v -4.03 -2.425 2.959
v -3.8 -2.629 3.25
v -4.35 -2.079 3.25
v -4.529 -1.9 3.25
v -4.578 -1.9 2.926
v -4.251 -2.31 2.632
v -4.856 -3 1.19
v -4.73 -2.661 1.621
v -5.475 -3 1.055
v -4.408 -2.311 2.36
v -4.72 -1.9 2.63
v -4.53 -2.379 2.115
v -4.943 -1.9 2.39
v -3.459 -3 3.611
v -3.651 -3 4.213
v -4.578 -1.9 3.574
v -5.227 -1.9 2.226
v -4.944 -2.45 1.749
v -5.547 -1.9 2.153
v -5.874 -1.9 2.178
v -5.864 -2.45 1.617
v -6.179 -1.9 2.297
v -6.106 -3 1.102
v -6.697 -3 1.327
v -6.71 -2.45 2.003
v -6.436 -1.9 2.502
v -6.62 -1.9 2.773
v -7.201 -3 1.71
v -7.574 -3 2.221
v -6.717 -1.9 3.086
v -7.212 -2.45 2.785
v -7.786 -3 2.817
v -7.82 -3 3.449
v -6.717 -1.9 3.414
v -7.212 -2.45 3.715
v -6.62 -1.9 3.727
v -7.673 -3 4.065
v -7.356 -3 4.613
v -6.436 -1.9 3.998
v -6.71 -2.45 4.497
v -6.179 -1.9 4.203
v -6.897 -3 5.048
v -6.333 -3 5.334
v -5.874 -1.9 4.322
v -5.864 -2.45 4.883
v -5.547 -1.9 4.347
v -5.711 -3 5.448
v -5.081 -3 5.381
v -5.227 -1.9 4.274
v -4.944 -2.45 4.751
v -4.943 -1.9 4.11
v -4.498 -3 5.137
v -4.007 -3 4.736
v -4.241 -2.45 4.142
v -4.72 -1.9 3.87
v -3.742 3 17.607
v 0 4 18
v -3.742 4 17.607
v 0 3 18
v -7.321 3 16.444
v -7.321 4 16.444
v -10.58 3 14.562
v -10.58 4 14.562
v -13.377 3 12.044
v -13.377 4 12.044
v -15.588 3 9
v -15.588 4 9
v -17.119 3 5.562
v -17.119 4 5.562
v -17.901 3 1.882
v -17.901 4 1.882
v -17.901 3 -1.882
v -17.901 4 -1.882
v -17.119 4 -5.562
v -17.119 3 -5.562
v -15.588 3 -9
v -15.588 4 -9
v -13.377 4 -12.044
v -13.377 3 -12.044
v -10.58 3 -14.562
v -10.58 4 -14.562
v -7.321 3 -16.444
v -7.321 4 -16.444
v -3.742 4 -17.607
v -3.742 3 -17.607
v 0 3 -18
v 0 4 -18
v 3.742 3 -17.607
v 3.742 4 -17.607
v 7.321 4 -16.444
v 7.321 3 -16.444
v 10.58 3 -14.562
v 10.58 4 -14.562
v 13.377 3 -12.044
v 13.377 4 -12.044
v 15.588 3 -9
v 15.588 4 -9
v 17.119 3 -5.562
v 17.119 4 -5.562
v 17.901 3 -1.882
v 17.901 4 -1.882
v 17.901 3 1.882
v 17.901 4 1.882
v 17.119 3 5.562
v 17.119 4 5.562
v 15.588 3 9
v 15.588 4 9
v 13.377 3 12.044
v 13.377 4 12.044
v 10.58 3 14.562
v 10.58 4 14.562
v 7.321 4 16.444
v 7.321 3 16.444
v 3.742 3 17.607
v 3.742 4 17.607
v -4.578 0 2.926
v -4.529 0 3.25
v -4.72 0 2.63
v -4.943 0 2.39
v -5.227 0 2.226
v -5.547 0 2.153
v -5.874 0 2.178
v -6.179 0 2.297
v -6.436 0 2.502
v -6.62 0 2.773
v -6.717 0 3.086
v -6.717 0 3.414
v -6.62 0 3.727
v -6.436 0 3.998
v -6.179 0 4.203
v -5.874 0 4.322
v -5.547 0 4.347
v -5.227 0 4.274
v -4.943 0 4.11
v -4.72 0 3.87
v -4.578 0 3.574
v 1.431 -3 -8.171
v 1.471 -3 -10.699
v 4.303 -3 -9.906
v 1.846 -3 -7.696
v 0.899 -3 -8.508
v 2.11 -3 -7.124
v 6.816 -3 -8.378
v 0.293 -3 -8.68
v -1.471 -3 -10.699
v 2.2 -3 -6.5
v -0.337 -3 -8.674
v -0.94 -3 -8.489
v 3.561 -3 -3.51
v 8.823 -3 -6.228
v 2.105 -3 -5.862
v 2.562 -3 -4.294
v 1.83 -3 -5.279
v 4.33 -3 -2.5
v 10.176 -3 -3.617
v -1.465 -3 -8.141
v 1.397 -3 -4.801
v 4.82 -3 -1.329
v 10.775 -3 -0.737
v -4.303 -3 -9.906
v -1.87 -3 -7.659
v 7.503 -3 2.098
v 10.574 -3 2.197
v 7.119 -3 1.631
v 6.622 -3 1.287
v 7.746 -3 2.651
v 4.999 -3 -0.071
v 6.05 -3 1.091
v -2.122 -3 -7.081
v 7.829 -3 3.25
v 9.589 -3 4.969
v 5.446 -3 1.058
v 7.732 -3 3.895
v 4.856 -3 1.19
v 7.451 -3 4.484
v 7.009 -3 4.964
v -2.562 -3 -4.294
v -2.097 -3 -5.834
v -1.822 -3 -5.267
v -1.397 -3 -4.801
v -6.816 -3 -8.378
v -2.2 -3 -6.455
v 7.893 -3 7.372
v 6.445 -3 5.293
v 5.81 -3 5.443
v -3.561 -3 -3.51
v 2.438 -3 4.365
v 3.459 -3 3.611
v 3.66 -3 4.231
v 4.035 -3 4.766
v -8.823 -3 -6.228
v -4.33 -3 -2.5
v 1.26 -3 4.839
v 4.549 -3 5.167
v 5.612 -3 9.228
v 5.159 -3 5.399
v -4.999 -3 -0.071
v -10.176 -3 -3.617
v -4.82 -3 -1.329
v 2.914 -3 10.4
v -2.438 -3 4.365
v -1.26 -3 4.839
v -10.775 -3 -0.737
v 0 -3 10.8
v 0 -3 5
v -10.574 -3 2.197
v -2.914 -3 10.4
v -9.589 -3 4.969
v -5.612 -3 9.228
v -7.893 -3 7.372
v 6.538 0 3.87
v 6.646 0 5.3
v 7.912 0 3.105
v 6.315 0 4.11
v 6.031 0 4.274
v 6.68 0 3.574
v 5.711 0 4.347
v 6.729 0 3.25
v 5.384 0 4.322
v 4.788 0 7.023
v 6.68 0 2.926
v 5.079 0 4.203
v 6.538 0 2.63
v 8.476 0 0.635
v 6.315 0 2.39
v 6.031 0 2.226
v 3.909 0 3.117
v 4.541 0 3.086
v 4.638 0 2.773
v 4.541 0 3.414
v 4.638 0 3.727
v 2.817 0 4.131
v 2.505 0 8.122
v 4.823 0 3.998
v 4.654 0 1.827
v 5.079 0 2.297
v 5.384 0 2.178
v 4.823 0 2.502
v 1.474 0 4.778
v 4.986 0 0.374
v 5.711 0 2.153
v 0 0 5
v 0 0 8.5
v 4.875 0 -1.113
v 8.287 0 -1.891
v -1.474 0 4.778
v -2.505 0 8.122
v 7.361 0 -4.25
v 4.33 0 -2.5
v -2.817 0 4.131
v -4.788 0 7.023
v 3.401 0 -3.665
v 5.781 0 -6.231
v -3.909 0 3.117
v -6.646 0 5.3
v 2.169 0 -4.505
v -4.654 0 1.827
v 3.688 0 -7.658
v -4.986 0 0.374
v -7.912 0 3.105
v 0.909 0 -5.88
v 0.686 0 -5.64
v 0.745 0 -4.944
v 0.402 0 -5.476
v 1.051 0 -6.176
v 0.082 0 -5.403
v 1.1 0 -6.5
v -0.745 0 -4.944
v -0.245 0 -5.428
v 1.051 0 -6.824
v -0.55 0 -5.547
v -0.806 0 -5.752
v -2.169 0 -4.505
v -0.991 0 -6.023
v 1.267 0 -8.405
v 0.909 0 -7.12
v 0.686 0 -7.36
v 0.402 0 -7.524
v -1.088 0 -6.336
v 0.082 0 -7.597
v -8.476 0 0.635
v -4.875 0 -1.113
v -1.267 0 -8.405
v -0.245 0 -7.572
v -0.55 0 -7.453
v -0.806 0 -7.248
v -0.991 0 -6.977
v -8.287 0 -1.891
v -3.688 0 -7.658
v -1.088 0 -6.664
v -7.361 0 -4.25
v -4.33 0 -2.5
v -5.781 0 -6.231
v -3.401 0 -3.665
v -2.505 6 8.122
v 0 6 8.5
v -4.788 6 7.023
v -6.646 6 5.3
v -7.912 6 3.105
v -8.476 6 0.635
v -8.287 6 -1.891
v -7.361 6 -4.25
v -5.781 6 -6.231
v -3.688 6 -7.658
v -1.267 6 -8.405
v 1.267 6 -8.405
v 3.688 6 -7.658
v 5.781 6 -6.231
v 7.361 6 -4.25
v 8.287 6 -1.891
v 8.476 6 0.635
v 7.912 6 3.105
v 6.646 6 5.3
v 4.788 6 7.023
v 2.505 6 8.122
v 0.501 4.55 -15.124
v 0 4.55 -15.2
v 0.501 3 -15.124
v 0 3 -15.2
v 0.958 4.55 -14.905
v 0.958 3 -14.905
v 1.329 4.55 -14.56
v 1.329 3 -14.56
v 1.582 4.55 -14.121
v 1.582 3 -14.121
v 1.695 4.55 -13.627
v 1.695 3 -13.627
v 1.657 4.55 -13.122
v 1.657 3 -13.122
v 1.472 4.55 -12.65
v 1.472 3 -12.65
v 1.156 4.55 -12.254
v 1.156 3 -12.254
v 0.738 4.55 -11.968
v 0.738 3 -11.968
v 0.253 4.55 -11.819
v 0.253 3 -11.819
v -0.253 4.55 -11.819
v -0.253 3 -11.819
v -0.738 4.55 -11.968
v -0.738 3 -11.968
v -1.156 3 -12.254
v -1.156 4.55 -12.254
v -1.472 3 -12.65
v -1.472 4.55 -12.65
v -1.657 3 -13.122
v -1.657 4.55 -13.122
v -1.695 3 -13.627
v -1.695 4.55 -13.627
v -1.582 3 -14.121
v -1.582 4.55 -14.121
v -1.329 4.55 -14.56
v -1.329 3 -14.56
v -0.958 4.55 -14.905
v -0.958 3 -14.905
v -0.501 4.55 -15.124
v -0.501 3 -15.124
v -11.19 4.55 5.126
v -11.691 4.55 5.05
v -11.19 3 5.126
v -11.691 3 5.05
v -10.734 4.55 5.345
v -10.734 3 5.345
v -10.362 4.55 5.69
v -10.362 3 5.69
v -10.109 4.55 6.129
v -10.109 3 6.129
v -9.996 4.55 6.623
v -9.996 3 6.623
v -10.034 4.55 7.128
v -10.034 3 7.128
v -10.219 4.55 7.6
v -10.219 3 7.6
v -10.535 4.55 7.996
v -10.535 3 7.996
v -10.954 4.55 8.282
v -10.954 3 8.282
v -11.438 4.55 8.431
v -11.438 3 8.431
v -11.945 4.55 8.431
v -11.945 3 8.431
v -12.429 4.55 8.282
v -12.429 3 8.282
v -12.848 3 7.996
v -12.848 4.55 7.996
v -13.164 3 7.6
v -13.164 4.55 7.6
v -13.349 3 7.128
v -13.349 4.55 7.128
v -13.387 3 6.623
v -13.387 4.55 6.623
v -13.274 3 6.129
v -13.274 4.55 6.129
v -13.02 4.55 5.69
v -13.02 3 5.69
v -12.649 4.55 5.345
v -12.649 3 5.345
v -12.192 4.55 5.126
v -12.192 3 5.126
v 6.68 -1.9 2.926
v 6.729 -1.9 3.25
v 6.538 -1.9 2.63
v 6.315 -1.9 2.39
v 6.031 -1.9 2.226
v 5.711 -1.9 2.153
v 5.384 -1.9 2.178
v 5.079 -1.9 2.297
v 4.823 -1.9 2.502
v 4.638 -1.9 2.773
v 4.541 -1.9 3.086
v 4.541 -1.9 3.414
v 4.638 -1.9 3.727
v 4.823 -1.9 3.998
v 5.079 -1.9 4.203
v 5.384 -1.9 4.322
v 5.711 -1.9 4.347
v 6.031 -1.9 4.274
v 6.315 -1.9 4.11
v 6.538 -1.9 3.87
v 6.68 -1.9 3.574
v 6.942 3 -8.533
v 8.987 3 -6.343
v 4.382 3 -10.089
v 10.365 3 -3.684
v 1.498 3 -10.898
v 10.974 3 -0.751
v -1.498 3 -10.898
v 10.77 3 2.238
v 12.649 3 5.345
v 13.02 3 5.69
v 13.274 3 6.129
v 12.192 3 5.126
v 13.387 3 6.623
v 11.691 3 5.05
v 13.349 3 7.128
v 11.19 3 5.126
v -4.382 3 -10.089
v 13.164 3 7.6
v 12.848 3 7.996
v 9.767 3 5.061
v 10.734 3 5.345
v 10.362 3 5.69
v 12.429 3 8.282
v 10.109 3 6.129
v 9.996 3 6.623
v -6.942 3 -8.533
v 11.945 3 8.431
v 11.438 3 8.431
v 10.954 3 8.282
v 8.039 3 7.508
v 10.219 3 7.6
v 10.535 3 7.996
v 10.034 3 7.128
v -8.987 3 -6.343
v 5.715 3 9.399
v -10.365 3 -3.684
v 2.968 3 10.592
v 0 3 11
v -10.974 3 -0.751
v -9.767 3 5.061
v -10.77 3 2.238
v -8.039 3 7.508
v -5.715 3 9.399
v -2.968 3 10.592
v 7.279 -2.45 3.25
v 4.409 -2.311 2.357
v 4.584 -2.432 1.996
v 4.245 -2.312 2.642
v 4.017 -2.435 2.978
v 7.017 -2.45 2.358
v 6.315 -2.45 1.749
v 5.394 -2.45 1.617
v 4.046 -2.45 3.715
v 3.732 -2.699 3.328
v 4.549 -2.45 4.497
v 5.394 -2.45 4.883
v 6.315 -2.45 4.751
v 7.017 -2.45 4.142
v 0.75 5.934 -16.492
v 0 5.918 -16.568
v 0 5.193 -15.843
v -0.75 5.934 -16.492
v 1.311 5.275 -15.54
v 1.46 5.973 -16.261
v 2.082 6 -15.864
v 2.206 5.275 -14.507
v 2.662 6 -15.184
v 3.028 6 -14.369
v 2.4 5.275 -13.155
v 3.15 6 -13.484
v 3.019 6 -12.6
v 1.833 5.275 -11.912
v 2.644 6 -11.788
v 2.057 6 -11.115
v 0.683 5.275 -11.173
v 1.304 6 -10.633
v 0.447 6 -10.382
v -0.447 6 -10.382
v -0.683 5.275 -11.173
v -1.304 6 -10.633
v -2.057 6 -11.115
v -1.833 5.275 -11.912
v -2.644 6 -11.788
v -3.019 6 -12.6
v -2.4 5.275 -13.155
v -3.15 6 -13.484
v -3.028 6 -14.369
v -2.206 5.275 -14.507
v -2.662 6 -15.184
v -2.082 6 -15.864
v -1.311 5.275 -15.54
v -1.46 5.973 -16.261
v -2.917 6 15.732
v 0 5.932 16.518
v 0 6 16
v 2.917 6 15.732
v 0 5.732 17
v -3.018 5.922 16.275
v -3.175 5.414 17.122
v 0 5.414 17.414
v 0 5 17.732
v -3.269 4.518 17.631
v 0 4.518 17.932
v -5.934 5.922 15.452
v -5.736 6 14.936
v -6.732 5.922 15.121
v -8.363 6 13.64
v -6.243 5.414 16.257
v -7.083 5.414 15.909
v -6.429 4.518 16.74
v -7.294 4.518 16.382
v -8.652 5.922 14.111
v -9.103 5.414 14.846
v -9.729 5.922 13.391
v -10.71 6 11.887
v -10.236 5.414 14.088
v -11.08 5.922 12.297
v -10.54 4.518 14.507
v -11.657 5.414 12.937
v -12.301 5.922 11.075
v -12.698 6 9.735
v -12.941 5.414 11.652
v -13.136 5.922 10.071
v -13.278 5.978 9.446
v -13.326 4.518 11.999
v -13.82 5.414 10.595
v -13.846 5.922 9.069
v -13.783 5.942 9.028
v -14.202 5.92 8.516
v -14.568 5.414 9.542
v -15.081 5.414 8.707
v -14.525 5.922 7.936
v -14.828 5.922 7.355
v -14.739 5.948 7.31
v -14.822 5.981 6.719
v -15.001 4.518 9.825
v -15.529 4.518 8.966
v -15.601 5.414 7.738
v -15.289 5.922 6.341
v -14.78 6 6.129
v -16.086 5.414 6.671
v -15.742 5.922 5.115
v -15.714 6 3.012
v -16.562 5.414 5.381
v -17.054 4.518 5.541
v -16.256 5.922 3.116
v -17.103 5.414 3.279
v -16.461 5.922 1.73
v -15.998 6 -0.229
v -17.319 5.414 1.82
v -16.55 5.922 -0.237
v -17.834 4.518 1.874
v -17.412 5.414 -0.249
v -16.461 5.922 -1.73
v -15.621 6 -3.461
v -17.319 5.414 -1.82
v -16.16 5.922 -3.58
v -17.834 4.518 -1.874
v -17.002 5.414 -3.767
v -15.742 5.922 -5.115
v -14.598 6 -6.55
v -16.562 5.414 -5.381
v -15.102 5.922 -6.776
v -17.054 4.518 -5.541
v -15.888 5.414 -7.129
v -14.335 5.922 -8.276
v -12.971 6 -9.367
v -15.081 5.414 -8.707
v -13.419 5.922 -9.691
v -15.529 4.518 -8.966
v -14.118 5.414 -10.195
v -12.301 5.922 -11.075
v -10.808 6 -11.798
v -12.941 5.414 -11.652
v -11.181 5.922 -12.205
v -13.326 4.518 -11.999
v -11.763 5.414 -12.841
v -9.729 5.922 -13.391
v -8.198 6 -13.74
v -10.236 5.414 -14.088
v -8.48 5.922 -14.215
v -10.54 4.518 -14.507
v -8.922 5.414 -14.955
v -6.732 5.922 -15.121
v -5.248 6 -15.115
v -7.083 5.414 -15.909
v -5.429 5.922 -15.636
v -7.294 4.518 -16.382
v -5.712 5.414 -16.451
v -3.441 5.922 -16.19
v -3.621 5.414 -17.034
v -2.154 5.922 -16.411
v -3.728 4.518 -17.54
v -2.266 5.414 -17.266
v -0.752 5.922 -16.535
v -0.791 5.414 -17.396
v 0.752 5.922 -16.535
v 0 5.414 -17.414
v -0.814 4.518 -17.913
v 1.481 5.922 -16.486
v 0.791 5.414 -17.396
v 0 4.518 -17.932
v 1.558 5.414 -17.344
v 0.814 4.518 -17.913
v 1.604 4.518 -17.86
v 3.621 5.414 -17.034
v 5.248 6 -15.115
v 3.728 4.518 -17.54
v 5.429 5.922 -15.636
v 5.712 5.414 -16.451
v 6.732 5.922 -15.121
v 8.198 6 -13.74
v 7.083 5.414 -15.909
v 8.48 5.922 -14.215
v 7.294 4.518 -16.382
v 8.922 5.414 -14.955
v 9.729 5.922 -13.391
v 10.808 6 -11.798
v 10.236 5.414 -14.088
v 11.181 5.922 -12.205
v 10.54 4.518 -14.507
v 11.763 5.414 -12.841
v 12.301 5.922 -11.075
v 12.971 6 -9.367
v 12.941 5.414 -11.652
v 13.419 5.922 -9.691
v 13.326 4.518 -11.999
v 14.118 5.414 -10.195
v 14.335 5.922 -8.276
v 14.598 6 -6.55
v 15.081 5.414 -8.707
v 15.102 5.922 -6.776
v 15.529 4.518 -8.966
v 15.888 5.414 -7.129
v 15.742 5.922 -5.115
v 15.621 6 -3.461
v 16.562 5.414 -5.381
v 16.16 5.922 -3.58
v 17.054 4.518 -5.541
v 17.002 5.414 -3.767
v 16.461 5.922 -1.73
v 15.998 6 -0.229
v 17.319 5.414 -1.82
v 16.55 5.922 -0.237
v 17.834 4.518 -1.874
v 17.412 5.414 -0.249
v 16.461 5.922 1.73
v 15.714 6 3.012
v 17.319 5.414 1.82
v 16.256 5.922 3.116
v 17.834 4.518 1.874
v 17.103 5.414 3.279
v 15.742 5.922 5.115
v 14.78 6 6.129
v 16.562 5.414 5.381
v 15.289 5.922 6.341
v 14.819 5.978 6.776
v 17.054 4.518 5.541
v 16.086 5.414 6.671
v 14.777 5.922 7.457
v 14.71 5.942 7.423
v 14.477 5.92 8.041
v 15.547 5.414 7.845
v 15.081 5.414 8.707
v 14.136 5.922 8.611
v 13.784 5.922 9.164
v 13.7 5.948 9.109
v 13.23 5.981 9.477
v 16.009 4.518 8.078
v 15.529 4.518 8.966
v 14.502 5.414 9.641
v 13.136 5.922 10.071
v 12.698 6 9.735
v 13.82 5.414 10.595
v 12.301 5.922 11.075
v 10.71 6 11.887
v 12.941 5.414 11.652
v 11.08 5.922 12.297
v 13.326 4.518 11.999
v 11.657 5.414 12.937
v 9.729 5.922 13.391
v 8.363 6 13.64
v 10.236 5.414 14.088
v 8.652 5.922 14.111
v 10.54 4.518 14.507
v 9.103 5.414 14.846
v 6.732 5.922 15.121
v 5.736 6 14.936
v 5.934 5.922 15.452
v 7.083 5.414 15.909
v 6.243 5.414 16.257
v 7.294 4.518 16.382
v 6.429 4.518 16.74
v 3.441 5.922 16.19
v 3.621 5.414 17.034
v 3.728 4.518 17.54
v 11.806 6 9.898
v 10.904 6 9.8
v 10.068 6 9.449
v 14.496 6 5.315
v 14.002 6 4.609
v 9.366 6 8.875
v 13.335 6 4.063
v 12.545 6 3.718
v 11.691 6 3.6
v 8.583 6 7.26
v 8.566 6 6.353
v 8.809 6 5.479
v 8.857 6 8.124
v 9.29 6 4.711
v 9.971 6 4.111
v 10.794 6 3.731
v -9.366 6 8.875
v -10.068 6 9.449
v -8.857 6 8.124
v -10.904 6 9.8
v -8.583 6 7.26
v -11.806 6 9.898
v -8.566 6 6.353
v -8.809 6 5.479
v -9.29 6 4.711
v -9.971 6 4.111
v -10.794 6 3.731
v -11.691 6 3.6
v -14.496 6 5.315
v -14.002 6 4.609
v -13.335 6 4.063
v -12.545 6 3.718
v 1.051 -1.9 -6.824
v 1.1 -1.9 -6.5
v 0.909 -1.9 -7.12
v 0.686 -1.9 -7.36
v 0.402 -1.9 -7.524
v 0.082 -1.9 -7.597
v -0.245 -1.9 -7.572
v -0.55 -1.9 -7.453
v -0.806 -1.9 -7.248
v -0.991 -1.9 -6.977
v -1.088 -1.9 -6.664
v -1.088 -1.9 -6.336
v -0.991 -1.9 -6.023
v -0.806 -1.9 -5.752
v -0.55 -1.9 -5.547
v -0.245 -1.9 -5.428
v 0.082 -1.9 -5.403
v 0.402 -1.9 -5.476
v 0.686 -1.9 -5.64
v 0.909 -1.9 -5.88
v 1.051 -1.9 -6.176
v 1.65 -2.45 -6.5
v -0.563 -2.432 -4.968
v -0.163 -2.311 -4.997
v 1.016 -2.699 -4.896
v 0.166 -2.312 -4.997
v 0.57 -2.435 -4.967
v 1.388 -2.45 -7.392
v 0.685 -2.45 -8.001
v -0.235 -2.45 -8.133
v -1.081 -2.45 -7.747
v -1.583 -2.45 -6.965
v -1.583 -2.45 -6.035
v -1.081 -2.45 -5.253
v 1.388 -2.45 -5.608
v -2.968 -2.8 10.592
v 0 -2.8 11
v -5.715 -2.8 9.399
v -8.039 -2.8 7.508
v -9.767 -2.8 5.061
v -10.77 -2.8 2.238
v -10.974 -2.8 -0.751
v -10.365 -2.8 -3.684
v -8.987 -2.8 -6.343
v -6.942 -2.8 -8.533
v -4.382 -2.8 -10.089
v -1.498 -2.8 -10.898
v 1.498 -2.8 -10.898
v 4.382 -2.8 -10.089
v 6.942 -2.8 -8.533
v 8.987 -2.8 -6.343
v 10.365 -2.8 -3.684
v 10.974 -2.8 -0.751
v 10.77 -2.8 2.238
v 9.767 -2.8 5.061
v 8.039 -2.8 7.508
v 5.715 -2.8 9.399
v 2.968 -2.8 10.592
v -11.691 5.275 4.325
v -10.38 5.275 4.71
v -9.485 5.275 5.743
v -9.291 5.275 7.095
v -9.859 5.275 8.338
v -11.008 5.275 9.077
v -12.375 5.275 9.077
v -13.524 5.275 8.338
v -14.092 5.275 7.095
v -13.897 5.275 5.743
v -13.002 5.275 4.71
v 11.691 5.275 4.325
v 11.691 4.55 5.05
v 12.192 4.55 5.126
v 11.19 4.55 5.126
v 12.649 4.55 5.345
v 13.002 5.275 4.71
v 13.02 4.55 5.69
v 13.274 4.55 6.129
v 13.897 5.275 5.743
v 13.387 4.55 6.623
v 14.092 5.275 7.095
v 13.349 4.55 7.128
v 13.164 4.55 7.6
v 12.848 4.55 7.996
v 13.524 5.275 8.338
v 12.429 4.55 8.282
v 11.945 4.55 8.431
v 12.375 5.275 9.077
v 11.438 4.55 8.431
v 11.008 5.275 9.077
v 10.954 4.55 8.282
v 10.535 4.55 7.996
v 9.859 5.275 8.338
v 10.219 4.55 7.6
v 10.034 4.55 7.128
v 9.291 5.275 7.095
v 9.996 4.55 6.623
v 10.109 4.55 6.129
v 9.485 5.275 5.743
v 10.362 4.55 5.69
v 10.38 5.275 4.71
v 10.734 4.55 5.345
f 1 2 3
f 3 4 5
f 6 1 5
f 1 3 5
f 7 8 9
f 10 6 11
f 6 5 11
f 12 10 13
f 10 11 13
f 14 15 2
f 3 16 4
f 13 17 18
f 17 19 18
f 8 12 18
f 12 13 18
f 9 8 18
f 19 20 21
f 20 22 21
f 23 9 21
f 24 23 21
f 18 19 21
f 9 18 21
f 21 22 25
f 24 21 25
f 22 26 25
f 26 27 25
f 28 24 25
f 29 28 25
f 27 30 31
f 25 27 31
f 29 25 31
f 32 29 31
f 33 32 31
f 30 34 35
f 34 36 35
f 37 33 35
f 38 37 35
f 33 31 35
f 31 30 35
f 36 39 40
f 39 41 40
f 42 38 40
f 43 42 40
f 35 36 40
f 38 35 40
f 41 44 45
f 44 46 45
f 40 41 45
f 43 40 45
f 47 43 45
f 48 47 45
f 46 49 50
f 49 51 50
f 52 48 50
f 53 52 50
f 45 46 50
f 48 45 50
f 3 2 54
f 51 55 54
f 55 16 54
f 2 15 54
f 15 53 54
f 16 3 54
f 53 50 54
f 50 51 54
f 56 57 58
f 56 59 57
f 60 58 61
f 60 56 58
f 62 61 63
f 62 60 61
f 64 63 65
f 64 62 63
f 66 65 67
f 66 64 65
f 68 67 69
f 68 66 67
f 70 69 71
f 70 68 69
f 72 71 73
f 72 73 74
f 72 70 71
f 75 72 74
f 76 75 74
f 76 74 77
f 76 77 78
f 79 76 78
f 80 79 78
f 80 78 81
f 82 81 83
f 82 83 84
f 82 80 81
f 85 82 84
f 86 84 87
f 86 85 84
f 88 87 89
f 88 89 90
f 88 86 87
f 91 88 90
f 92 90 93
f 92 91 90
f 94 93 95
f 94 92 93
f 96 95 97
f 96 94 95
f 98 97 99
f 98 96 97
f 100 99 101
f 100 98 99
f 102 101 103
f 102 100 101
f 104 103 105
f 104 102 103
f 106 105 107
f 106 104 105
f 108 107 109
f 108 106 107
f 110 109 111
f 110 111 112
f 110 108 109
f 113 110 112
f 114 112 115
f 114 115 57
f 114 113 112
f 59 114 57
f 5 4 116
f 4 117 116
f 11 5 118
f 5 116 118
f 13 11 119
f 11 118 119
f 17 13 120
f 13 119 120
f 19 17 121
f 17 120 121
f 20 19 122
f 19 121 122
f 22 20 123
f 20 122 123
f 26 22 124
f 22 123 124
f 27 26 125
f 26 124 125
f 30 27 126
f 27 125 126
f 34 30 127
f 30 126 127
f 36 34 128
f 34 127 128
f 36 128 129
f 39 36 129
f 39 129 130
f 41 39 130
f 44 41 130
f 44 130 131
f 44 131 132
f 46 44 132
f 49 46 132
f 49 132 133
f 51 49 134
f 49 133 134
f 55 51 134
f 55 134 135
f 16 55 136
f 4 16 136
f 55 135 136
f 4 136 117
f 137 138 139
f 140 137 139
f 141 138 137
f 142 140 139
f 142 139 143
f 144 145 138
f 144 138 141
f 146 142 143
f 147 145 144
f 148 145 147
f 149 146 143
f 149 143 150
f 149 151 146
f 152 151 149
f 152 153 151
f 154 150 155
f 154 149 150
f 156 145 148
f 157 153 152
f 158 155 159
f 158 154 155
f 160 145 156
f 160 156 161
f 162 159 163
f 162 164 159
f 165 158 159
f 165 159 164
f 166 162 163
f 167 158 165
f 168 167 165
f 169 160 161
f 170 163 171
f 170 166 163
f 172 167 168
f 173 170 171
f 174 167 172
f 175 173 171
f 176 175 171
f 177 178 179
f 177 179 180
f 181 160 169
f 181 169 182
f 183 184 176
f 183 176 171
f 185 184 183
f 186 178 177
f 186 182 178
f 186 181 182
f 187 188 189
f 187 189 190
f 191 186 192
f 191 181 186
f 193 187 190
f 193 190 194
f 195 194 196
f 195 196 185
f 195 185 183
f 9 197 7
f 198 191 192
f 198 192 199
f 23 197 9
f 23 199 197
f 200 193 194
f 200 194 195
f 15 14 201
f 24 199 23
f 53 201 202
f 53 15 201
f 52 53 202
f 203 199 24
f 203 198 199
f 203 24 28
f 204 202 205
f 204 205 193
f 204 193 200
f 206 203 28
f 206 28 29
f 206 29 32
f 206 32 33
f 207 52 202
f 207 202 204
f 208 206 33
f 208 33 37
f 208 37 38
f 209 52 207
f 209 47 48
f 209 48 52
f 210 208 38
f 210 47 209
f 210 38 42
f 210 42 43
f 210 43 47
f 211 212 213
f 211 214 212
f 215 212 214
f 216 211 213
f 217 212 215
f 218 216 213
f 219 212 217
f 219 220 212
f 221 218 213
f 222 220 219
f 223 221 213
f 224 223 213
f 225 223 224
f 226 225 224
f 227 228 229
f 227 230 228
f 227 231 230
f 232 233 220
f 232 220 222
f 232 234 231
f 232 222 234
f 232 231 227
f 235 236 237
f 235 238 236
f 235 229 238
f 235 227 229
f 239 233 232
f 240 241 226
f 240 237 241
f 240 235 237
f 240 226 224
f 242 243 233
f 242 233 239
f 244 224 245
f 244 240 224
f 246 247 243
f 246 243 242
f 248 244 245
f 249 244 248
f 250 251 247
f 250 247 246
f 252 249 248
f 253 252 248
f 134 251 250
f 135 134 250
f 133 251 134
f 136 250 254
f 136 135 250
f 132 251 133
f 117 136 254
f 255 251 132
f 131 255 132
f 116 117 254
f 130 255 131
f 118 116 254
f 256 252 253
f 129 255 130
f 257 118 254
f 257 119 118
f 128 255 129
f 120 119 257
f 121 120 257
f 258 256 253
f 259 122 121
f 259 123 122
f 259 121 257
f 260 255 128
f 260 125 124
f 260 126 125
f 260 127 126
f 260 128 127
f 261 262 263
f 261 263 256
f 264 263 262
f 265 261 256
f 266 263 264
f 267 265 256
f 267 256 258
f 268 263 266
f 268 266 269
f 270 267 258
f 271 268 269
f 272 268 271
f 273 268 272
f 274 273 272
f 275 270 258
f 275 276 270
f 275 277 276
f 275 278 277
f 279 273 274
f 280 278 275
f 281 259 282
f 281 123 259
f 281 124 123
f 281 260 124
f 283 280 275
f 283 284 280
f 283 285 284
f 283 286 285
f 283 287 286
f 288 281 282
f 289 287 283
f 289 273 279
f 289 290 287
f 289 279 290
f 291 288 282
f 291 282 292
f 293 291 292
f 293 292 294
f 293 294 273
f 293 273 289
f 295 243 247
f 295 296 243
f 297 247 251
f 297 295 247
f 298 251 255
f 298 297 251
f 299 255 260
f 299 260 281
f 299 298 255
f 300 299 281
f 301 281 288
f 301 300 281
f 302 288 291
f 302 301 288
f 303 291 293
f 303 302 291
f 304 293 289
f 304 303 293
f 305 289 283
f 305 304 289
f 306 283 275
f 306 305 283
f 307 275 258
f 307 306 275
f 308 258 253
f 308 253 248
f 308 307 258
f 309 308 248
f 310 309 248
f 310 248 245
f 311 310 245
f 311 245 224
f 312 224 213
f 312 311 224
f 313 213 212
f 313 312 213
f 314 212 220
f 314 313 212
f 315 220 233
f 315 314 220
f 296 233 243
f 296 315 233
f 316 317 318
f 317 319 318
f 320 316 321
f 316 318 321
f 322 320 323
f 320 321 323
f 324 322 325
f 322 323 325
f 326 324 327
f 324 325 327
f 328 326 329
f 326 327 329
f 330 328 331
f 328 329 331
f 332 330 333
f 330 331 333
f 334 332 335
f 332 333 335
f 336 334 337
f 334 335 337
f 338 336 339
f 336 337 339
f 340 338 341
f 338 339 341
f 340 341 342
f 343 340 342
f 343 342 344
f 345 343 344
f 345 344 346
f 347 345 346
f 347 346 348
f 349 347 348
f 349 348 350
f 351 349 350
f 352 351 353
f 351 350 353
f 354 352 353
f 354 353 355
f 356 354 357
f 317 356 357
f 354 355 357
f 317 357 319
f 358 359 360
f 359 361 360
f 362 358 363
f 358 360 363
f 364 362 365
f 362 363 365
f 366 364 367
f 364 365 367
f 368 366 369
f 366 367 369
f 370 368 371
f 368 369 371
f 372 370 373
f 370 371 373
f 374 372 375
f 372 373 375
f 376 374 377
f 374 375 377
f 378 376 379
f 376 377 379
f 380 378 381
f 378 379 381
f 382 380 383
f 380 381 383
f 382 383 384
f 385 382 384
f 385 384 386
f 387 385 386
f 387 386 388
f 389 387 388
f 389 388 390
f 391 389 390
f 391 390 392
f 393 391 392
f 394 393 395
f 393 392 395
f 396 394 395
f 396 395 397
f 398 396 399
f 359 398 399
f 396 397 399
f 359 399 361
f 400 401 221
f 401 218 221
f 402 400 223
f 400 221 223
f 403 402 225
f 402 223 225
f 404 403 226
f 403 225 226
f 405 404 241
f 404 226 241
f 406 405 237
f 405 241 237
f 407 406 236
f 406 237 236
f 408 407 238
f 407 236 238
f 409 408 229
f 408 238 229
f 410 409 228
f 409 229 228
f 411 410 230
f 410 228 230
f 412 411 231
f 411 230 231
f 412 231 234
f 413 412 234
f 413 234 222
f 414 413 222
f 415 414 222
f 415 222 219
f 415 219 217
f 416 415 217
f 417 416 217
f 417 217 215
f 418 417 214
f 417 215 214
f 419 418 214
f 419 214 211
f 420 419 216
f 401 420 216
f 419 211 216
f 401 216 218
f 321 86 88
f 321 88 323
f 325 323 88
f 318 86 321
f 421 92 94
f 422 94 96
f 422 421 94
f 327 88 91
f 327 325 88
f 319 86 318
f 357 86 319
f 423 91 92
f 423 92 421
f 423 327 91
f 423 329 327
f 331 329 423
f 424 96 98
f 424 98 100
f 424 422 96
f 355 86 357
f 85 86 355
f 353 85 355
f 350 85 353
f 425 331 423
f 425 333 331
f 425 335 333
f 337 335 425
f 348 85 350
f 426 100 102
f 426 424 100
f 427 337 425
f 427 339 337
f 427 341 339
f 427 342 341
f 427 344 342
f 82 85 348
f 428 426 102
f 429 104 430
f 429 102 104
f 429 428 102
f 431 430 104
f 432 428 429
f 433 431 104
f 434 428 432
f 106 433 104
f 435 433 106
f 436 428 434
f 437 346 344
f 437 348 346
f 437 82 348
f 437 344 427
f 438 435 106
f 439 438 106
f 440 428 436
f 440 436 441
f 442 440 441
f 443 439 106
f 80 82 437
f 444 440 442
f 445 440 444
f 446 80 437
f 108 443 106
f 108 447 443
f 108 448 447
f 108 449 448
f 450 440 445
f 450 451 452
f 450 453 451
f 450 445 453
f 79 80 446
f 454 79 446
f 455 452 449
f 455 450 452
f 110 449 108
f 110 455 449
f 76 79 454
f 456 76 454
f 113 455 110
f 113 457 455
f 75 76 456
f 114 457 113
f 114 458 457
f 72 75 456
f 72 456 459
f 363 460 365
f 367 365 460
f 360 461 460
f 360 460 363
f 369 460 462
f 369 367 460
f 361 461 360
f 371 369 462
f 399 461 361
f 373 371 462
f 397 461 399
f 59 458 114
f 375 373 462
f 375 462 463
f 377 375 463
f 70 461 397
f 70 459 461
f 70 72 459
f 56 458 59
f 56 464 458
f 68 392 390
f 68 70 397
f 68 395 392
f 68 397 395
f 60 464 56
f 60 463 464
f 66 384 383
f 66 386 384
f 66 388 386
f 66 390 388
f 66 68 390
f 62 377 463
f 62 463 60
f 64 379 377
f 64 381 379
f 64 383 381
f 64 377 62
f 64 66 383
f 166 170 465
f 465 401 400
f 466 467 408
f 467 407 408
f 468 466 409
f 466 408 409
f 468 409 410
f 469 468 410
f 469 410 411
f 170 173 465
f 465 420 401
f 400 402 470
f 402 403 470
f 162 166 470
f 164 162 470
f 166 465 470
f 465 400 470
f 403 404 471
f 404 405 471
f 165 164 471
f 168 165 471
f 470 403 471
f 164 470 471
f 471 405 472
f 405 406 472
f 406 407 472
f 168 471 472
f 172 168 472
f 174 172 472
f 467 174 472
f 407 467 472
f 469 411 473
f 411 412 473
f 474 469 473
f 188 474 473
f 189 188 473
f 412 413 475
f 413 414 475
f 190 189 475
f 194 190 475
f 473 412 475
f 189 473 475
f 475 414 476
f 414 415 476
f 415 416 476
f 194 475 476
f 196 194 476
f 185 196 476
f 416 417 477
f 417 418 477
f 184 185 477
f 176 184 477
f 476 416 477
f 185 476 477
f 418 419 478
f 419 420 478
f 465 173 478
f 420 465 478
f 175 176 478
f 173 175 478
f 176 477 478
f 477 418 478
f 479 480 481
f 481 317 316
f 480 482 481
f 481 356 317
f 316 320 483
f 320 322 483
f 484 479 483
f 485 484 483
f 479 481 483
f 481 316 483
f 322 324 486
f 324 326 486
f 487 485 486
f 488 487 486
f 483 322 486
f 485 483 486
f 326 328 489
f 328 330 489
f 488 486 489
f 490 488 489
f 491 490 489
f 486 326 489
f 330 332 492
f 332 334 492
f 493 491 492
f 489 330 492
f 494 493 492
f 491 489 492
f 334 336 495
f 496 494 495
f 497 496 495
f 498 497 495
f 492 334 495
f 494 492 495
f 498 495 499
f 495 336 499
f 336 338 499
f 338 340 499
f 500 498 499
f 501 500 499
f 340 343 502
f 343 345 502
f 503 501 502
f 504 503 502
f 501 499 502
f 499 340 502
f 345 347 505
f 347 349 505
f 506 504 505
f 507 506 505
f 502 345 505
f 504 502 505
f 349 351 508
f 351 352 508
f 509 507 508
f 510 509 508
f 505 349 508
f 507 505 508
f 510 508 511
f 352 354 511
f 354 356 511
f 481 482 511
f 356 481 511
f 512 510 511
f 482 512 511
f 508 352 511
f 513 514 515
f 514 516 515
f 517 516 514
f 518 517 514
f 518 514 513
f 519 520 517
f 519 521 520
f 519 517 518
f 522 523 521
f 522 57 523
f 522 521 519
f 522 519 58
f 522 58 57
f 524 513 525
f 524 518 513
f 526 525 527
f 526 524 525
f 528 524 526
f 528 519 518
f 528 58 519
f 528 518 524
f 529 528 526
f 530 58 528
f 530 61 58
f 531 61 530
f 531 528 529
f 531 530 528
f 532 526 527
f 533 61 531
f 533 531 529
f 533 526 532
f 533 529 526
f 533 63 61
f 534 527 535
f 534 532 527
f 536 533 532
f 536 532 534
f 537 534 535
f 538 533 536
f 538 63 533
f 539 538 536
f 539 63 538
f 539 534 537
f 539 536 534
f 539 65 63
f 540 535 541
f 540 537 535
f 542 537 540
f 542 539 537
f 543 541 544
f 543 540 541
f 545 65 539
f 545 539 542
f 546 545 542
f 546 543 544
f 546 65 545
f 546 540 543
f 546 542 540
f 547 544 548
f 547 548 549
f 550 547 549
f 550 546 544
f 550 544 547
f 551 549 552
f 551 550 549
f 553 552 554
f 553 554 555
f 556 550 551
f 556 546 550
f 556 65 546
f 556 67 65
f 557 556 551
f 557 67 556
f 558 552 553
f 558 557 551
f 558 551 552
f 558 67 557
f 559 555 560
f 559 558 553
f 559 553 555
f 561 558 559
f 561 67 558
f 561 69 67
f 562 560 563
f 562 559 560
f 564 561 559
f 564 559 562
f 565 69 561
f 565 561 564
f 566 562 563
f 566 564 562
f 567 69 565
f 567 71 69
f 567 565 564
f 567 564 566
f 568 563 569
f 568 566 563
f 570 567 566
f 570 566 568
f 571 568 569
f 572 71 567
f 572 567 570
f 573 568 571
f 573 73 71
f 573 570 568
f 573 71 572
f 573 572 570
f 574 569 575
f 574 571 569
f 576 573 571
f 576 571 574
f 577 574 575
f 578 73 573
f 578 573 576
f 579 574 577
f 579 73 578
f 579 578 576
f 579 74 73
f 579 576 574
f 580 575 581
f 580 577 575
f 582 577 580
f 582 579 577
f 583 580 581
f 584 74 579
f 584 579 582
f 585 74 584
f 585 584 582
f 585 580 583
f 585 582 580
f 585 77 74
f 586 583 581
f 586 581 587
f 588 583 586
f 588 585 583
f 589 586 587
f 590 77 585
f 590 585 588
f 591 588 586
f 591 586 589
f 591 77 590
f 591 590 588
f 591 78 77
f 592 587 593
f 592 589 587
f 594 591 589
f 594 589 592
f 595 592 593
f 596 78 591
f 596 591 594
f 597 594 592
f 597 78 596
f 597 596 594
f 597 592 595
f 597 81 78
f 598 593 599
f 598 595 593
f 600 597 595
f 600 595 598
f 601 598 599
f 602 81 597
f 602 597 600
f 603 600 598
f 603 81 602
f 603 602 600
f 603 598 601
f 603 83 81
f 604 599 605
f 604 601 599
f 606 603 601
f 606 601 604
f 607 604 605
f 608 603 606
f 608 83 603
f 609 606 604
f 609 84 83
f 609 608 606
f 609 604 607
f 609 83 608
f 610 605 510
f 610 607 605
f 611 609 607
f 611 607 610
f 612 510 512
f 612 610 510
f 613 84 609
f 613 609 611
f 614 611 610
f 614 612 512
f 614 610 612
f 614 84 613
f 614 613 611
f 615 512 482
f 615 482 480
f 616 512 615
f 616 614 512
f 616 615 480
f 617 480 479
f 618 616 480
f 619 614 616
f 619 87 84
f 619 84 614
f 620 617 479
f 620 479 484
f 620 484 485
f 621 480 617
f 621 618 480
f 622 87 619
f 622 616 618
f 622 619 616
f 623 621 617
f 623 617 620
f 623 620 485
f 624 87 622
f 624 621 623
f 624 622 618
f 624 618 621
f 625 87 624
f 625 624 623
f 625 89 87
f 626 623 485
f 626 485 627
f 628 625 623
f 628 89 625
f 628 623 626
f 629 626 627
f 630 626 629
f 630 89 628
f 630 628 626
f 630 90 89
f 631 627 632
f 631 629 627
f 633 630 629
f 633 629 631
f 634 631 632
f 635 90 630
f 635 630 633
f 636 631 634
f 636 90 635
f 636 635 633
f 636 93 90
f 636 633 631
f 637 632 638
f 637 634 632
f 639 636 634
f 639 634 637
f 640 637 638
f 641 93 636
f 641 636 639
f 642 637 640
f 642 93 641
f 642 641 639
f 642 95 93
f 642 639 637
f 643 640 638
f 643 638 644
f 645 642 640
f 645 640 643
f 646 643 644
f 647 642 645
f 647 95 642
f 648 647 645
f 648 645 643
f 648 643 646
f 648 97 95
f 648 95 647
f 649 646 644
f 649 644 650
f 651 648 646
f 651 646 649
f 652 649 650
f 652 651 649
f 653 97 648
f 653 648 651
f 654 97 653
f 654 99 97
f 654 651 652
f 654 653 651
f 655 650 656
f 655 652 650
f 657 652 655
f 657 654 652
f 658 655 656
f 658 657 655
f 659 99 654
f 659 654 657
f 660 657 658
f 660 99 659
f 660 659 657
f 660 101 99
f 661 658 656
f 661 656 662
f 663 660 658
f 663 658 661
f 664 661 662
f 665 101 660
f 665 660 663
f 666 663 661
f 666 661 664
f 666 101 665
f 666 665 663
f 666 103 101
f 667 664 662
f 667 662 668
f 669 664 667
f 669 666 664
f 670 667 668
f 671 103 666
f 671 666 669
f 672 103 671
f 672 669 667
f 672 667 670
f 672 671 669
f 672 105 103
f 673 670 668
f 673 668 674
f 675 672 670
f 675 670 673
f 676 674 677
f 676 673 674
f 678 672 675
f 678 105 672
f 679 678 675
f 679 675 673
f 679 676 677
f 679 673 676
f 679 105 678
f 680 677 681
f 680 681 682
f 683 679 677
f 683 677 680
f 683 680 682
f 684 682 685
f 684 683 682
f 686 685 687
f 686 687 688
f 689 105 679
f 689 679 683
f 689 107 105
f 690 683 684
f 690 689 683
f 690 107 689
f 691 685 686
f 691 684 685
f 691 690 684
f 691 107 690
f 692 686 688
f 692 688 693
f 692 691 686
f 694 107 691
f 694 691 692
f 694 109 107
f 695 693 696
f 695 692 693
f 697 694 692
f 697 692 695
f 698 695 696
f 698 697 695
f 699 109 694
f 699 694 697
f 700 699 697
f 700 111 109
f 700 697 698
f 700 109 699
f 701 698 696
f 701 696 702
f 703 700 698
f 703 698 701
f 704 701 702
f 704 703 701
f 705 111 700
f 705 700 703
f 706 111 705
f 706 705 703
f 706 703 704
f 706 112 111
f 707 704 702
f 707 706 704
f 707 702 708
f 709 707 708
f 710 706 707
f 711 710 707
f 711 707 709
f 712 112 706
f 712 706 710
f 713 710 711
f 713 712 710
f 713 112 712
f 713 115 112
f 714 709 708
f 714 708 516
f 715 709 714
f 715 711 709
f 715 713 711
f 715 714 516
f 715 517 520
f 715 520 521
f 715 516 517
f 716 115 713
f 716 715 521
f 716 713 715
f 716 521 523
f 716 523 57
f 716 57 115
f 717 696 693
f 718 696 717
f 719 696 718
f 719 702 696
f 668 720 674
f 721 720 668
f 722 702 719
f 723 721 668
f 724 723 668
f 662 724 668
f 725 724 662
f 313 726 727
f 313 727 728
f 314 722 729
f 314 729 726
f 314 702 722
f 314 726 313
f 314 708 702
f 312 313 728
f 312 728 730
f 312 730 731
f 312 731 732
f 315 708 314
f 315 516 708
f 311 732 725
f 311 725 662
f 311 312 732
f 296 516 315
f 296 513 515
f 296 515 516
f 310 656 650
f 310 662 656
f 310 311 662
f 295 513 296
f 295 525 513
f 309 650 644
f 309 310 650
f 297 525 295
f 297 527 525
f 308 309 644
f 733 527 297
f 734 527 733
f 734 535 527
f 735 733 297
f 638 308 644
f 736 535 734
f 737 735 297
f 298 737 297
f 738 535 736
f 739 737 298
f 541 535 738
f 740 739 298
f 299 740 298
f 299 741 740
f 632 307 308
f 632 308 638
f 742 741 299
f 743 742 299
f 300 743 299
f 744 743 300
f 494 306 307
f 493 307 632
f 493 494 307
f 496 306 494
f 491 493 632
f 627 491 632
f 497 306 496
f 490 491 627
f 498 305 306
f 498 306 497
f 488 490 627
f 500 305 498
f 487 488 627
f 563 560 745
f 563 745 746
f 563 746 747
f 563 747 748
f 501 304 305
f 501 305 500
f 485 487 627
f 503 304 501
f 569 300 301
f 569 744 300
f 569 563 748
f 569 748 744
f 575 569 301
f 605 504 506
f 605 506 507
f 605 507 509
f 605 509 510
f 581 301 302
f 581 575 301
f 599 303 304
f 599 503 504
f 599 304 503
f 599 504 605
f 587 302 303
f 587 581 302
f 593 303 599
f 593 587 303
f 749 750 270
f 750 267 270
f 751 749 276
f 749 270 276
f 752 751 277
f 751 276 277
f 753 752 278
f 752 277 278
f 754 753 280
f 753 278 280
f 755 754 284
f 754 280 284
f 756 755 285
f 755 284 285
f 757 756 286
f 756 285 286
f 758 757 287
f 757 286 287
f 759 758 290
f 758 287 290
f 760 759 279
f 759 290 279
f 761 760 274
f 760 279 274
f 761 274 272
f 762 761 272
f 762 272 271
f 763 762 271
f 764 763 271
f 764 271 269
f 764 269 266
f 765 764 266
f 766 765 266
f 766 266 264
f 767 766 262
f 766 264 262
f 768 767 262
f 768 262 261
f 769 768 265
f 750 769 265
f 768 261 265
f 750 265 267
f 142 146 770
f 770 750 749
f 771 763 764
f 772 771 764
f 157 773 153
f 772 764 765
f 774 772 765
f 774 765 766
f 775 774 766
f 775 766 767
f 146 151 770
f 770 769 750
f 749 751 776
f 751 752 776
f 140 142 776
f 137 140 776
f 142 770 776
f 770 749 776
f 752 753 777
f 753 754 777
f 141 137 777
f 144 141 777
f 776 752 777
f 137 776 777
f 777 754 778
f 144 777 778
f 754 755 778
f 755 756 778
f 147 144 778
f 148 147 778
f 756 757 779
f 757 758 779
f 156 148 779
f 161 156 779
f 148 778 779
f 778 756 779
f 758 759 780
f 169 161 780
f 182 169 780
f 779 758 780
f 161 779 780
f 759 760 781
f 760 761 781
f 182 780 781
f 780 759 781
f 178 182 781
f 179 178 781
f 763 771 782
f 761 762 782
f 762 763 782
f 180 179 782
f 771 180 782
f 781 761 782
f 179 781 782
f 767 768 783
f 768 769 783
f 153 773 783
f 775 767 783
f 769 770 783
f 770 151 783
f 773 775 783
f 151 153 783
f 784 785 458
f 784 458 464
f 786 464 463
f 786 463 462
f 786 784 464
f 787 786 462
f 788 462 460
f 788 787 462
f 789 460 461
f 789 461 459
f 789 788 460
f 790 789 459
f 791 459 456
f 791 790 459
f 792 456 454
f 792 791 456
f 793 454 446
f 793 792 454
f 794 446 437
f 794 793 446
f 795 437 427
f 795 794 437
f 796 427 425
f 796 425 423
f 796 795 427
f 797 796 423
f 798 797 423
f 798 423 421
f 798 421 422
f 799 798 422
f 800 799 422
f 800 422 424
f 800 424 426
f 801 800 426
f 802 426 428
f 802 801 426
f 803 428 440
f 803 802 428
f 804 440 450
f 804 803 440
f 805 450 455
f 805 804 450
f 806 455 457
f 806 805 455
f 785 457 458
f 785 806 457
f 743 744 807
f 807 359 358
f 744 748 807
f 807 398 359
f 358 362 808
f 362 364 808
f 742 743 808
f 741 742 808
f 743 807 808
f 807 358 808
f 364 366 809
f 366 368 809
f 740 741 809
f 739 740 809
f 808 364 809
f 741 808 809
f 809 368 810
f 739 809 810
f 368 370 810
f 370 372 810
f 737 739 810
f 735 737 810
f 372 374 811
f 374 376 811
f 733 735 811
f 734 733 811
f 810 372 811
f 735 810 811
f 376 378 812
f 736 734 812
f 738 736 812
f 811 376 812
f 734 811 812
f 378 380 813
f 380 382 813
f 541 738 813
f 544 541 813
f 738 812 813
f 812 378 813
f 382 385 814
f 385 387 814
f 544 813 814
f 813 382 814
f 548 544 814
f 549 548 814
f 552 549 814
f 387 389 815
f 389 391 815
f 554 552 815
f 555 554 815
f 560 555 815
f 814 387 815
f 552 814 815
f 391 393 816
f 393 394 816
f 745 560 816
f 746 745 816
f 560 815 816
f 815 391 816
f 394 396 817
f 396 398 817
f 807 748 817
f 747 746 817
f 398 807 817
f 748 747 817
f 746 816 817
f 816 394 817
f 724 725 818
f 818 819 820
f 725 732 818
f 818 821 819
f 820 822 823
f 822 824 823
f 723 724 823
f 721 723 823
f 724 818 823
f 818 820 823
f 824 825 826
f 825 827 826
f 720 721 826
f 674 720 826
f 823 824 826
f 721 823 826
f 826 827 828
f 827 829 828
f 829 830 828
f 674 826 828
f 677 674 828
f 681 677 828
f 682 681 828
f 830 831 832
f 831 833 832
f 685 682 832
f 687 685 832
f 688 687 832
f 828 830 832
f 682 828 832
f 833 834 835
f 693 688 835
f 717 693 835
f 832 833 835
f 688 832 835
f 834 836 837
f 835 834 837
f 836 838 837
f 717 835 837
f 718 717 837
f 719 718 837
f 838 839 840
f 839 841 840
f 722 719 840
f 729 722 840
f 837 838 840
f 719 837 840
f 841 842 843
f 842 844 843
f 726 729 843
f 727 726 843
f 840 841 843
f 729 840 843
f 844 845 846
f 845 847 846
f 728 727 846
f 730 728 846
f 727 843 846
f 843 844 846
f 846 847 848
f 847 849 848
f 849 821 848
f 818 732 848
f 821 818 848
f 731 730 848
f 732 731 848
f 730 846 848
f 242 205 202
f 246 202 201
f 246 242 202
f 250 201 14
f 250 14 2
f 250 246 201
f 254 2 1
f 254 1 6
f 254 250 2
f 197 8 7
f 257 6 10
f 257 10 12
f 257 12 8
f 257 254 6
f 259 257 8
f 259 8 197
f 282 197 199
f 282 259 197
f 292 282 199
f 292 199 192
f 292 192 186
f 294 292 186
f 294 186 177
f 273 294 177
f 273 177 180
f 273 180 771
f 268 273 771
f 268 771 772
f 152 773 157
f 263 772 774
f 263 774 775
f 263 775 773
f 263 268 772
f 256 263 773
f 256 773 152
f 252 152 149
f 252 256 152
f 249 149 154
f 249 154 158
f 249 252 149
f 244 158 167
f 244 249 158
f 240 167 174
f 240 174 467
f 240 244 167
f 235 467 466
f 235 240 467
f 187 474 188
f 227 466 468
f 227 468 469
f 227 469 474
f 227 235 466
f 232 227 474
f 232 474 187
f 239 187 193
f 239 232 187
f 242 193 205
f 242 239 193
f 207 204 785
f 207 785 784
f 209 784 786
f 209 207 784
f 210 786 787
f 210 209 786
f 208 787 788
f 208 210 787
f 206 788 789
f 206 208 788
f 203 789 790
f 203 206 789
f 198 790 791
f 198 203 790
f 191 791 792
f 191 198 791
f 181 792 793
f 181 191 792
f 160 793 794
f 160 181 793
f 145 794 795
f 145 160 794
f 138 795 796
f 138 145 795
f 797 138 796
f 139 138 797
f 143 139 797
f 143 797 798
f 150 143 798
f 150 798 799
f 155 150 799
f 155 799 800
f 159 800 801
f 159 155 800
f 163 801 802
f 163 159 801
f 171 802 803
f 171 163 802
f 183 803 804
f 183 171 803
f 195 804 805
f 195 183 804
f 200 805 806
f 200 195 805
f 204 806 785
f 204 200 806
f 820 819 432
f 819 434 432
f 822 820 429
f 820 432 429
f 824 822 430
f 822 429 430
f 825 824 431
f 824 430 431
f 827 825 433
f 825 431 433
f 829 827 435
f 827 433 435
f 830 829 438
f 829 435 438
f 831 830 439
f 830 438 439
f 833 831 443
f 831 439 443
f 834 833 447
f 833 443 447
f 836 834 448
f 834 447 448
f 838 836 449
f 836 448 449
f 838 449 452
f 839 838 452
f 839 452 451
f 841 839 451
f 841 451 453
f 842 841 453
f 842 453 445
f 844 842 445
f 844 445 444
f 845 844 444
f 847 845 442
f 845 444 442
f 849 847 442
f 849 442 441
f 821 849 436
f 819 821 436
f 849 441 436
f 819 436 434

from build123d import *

# Parameters (mm, degrees)
CHANFREIN1_SIZE                                = 0.2
FRAISAGE_POUR_VIS_T_TE_FRAIS_E_M31_D           = 3.4
FRAISAGE_POUR_VIS_T_TE_FRAIS_E_M31_CSINK_D     = 6.3
FRAISAGE_POUR_VIS_T_TE_FRAIS_E_M31_CSINK_ANGLE = 90
CONG_1_R                                       = 2
FRAISAGE_POUR_VIS_T_TE_FRAIS_E_M22_D           = 2.2
FRAISAGE_POUR_VIS_T_TE_FRAIS_E_M22_CSINK_D     = 4.4
FRAISAGE_POUR_VIS_T_TE_FRAIS_E_M22_CSINK_ANGLE = 90


with BuildPart() as part:
    # Esquisse1 → Révolution1 (revolve)
    with BuildSketch(Plane(origin=(0, 0, 0), x_dir=(0, 0, -1), z_dir=(1, 0, 0))):
        Polygon((-5, -3), (-5, 0), (-8.5, 0), (-8.5, 6), (-18, 6), (-18, 3), (-11, 3), (-11, -3), align=None)
    revolve(axis=Axis((0, 0, 0), (0, -1, 0)))

    # Chanfrein1
    chanfrein1_edges = [part.edges().sort_by_distance(p)[0] for p in [
        (0, -3, -11),
    ]]
    chamfer(chanfrein1_edges, length=CHANFREIN1_SIZE)

    # Fraisage pour vis à tête fraisée M31 (through all)
    with Locations(Plane(origin=(0, 6, -13.5), x_dir=(0, 0, 1), z_dir=(0, 1, 0))):
        with Locations((0, 0), (20.25, 11.691342951), (20.25, -11.691342951)):
            CounterSinkHole(FRAISAGE_POUR_VIS_T_TE_FRAIS_E_M31_D / 2, FRAISAGE_POUR_VIS_T_TE_FRAIS_E_M31_CSINK_D / 2, counter_sink_angle=FRAISAGE_POUR_VIS_T_TE_FRAIS_E_M31_CSINK_ANGLE)

    # Congé1
    # the kernel refuses this fillet: 2 mm, written as the material it takes off along each edge
    with BuildSketch(Plane(origin=(0, 6, 0), x_dir=(0, 0, 1), z_dir=(1, 0, 0))) as cong_1_piece_1:
        with BuildLine():
            CenterArc((18 - CONG_1_R, CONG_1_R), CONG_1_R, 270, 90)
            Line((18, CONG_1_R), (18, 0))
            Line((18, 0), (18 - CONG_1_R, 0))
        make_face()
    revolve(axis=Axis((0, 6, 0), (0, -1, 0)), mode=Mode.SUBTRACT)

    # Fraisage pour vis à tête fraisée M22 (through all)
    with Locations(Plane(origin=(0, -3, 0), x_dir=(-1, 0, 0), z_dir=(0, -1, 0))):
        with Locations((0, 6.5), (-5.629165125, -3.25), (5.629165125, -3.25)):
            CounterSinkHole(FRAISAGE_POUR_VIS_T_TE_FRAIS_E_M22_D / 2, FRAISAGE_POUR_VIS_T_TE_FRAIS_E_M22_CSINK_D / 2, counter_sink_angle=FRAISAGE_POUR_VIS_T_TE_FRAIS_E_M22_CSINK_ANGLE)


solid = part.part
